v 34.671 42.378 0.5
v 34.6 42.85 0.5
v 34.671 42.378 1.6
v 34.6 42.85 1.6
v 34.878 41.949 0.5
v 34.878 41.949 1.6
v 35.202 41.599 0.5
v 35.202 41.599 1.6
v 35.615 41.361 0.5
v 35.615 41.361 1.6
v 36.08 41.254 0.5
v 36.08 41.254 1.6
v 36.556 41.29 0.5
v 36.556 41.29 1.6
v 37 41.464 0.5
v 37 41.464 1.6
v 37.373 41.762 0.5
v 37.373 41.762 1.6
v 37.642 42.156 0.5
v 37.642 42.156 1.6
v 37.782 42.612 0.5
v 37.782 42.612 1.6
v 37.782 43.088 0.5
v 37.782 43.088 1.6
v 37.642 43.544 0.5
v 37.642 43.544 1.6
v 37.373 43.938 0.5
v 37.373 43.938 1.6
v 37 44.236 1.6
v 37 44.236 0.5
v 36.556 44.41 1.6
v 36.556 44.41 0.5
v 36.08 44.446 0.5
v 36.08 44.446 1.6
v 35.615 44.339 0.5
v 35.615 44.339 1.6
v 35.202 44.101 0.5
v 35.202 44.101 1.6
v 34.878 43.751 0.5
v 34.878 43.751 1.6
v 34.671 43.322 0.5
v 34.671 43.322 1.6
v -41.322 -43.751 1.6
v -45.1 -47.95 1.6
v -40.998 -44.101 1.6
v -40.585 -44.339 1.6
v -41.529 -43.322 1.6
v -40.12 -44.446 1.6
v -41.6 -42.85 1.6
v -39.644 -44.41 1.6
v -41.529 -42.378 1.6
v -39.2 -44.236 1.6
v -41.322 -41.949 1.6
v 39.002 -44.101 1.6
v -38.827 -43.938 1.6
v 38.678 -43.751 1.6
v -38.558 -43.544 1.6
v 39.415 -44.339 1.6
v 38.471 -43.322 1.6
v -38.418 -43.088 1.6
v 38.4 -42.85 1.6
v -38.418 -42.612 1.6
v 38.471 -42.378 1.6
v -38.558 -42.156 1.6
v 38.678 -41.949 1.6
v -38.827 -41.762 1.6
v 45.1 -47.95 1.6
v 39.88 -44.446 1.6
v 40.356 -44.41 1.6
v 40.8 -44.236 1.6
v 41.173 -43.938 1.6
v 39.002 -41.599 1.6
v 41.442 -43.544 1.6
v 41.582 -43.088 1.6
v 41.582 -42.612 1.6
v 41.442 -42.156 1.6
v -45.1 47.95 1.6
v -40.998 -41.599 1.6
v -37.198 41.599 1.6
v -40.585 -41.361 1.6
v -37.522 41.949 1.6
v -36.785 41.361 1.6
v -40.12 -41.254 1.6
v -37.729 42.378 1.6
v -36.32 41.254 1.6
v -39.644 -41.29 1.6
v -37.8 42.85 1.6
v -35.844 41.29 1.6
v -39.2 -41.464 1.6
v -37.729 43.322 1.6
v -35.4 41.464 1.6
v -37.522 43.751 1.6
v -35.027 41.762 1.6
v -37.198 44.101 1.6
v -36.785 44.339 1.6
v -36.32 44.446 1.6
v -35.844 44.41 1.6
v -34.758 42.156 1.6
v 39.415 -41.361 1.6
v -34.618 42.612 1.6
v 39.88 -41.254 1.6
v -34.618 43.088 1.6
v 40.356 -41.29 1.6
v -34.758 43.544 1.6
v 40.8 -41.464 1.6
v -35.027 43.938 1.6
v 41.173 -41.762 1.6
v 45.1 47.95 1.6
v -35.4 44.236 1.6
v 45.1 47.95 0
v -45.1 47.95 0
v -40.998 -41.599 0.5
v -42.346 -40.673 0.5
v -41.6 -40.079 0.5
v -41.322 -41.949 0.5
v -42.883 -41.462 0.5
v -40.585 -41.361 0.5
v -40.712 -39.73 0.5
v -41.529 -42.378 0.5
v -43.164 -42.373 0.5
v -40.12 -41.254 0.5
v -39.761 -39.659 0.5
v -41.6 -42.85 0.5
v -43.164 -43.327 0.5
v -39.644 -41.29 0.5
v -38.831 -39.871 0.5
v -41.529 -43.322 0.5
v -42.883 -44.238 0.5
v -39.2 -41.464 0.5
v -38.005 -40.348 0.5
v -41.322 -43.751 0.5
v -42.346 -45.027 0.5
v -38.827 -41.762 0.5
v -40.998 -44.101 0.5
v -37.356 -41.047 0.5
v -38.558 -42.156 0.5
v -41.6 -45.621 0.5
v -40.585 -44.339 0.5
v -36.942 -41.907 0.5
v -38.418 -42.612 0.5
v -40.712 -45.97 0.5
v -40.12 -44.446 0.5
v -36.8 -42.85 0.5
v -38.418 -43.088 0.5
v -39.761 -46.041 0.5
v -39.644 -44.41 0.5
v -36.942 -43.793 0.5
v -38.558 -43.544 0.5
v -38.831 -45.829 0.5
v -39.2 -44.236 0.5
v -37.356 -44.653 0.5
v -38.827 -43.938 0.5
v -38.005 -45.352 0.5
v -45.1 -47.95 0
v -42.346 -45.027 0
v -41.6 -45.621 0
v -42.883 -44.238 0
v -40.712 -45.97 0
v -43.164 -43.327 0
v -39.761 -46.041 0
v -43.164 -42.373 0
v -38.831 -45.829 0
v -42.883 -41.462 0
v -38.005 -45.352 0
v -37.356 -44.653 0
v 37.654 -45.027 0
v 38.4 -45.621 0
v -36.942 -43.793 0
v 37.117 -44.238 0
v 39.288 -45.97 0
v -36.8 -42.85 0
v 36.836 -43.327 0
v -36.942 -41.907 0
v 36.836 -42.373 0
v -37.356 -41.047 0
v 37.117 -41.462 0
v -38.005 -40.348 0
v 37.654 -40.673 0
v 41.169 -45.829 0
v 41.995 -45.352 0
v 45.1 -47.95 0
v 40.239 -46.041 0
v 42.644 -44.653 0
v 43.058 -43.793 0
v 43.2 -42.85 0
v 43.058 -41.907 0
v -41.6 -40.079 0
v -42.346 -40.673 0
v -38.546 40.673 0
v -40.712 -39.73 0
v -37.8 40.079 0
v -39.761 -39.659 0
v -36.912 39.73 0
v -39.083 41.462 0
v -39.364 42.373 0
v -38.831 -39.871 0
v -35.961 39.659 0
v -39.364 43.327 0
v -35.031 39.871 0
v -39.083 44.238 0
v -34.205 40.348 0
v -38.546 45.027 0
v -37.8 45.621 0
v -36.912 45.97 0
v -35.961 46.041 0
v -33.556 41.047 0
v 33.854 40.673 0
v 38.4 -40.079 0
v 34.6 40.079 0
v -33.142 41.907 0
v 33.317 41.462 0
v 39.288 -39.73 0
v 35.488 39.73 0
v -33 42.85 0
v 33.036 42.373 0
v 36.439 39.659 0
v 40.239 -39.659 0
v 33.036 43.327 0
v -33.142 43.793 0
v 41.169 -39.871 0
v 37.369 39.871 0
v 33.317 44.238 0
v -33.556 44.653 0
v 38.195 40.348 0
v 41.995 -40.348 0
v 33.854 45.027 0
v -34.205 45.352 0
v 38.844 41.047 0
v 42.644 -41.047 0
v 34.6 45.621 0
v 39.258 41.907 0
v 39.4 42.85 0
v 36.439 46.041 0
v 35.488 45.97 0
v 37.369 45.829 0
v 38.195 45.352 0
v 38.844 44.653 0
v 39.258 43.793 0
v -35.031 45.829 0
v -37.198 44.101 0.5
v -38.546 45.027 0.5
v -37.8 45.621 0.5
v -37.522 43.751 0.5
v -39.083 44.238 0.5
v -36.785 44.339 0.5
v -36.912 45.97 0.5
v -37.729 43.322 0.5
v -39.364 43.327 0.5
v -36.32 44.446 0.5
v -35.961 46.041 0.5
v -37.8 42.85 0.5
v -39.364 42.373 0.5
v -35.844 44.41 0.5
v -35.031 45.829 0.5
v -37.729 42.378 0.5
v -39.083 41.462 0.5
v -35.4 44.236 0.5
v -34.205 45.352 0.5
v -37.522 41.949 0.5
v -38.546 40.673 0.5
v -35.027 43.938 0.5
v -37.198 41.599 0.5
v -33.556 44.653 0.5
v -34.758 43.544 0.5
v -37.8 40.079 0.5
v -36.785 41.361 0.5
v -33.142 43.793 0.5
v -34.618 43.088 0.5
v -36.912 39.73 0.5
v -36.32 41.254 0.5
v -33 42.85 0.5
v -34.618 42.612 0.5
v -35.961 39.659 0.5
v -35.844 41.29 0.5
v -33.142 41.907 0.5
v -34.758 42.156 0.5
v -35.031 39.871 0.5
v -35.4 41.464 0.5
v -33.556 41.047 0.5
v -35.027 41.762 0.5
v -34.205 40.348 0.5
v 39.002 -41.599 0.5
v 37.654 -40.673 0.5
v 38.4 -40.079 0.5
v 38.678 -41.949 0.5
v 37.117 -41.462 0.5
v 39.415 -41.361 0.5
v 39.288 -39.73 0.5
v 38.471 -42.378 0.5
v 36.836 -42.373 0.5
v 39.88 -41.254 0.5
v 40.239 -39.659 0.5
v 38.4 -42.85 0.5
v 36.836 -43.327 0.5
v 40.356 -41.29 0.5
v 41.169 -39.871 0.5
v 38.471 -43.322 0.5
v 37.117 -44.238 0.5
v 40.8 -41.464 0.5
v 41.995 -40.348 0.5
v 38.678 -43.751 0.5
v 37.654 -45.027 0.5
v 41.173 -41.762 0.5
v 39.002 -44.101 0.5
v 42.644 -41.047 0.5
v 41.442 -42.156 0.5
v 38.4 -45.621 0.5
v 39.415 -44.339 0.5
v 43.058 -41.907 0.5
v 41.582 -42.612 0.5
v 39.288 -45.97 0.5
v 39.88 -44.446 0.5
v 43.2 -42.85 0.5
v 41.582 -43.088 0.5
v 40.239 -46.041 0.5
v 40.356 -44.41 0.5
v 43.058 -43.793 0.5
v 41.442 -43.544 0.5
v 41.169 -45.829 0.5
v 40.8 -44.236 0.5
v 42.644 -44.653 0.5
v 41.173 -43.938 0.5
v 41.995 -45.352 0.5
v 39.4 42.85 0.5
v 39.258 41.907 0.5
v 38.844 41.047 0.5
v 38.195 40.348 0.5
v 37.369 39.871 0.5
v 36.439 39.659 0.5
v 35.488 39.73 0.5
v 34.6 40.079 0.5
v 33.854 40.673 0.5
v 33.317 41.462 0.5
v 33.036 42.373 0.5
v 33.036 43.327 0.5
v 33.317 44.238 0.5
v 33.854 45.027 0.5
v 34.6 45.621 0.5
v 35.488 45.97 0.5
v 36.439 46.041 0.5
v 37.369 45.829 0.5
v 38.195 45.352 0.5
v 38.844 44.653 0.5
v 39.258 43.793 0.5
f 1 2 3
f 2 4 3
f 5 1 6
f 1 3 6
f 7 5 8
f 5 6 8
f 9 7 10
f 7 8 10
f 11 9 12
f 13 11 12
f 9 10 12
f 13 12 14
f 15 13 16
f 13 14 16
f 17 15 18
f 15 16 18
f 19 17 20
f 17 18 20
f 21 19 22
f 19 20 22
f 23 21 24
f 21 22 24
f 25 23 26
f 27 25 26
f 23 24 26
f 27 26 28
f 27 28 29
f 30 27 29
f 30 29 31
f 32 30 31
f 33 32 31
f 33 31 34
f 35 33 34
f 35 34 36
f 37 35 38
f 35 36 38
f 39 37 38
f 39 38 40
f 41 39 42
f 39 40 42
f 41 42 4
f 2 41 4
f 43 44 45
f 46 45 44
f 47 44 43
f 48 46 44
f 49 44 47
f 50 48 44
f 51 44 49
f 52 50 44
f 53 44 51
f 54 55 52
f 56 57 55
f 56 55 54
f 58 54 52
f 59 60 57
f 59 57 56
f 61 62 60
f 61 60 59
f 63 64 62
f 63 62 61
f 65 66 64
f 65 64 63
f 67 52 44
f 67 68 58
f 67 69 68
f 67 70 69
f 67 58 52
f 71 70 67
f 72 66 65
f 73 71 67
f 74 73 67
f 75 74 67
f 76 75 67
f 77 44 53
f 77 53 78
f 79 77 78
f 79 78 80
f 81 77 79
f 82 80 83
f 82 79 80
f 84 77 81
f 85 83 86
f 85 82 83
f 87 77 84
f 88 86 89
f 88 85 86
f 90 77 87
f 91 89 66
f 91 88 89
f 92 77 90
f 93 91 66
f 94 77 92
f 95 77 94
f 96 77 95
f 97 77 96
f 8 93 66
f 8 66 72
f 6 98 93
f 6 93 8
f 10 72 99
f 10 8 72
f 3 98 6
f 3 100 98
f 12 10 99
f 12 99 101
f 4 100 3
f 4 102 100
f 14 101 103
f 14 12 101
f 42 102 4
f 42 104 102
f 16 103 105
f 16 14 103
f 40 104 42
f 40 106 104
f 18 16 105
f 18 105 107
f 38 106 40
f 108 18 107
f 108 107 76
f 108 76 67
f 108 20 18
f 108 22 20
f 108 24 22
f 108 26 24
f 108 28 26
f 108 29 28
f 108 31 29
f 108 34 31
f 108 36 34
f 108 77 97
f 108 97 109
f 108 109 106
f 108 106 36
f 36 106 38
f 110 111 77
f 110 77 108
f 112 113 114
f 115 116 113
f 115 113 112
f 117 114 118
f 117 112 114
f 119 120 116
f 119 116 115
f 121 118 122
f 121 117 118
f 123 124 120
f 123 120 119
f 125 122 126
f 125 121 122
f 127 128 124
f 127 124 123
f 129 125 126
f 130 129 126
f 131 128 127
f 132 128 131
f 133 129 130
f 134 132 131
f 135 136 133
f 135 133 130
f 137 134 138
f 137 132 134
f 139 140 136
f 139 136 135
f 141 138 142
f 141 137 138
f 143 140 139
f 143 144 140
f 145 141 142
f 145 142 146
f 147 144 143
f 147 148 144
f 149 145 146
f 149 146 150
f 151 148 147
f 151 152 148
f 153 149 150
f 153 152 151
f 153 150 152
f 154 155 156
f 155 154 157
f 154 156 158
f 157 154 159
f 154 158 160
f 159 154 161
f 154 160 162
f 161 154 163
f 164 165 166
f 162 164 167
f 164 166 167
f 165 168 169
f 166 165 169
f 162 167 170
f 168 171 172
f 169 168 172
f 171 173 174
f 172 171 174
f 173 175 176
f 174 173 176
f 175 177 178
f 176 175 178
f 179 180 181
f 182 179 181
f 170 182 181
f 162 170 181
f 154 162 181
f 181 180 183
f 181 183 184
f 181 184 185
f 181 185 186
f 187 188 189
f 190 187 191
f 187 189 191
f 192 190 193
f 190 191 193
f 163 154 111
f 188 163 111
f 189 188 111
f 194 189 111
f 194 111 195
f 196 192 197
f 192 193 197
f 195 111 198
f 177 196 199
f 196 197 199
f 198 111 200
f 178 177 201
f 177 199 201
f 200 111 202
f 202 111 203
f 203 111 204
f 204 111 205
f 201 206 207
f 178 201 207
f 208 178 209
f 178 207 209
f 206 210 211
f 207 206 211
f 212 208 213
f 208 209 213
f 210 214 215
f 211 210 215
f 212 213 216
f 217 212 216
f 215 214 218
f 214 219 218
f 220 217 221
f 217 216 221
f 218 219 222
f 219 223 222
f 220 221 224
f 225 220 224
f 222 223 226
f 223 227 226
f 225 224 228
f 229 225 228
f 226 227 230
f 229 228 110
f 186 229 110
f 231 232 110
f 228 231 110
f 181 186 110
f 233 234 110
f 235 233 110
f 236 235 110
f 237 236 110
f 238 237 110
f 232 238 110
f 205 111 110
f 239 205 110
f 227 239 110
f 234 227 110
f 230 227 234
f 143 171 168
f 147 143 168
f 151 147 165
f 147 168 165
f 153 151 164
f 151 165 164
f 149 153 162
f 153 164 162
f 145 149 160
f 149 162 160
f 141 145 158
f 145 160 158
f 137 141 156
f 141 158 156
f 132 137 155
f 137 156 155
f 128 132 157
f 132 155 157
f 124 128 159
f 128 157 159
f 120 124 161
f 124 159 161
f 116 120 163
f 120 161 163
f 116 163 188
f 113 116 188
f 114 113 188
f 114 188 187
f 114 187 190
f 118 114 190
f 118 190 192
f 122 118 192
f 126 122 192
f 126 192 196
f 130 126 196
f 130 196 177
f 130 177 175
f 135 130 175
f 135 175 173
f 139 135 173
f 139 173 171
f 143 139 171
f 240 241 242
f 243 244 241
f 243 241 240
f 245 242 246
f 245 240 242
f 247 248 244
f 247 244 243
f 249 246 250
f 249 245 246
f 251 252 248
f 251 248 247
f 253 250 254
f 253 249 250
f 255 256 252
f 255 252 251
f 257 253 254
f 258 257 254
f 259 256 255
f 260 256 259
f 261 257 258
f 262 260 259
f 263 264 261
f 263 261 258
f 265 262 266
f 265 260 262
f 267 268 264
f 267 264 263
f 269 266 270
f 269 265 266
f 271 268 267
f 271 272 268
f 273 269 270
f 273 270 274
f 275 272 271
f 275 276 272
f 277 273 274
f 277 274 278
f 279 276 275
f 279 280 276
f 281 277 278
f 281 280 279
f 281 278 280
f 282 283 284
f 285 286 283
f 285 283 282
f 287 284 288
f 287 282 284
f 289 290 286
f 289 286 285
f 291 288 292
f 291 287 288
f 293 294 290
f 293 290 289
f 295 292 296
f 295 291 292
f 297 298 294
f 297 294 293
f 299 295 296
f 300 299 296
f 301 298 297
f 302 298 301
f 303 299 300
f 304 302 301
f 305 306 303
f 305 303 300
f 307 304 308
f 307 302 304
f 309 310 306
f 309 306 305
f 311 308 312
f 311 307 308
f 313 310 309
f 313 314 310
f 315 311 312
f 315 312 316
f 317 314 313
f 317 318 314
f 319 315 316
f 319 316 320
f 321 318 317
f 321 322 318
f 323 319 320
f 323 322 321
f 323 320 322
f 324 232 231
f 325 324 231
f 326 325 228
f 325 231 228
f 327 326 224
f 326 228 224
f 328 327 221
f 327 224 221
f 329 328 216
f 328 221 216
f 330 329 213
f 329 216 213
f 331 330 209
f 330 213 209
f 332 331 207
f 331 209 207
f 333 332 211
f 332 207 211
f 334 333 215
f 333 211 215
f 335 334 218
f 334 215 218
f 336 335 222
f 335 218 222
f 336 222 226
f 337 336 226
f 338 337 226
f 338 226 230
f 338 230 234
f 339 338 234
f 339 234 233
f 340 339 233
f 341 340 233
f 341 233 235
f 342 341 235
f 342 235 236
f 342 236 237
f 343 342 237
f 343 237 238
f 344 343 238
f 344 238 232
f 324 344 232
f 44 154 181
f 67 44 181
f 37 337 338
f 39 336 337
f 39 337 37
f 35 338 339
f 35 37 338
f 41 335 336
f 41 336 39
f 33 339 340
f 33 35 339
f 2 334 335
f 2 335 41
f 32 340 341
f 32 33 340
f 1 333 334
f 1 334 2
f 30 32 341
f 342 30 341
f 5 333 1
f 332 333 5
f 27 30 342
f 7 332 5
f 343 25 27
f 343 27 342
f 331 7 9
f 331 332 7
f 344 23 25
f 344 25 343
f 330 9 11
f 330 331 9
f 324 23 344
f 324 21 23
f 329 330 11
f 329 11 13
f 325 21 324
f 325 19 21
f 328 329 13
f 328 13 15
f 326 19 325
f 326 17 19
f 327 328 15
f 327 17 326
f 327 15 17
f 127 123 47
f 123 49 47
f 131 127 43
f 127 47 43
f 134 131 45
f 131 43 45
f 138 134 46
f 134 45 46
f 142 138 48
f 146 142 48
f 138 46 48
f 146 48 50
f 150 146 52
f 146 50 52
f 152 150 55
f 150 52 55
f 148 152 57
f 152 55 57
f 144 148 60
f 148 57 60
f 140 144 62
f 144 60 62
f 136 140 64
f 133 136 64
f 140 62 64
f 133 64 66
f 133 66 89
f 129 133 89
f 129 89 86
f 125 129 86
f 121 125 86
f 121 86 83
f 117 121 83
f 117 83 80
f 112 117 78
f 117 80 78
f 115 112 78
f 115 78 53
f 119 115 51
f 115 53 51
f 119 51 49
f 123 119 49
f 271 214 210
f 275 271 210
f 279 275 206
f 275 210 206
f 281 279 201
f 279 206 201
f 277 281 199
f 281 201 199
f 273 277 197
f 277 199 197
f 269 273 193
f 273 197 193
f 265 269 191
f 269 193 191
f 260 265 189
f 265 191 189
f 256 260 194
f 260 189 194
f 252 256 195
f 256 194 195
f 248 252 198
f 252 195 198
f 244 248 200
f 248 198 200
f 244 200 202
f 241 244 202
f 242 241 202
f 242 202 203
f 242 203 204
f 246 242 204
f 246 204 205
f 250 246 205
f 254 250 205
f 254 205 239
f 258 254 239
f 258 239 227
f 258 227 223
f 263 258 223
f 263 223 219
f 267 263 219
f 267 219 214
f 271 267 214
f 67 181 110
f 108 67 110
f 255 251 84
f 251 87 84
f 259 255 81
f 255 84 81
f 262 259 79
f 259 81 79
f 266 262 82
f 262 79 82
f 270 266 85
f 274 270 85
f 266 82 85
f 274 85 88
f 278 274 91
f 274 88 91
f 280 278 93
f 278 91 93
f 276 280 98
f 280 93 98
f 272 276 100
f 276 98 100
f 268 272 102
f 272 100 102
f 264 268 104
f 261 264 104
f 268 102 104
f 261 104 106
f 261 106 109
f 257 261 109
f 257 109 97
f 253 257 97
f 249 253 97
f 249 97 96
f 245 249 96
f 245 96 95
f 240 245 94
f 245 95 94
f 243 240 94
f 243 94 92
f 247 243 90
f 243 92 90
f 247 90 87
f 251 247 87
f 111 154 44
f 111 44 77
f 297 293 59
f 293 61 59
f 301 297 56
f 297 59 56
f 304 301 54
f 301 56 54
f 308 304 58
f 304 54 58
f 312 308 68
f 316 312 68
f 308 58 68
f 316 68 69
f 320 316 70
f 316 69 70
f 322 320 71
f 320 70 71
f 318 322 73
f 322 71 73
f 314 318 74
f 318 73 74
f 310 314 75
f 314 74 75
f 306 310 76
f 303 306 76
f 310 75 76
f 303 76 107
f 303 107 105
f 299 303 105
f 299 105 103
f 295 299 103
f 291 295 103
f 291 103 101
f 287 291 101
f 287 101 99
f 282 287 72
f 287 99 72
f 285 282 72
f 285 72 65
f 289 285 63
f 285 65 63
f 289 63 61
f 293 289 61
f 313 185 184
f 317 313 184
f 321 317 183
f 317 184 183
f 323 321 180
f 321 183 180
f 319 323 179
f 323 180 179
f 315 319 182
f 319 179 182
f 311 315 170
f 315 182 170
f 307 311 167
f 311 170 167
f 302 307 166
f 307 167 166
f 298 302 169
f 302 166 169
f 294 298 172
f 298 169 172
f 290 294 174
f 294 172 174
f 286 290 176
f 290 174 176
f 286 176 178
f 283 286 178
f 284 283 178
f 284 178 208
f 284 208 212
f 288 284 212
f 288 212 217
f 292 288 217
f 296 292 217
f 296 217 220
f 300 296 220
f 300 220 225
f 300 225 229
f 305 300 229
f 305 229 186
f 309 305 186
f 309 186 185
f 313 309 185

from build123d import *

# Parameters (mm, degrees)
F0_W           = 90.2
F0_H           = 95.9
F1_DEPTH       = 1.6
F2_D           = 3.2
F2_CBORE_D     = 6.4
F2_CBORE_DEPTH = 0.5
F3_D           = 3.2
F3_CBORE_D     = 6.4
F3_CBORE_DEPTH = 0.5
F4_D           = 3.2
F4_CBORE_D     = 6.4
F4_CBORE_DEPTH = 0.5
F5_D           = 3.2
F5_CBORE_D     = 6.4
F5_CBORE_DEPTH = 0.5


with BuildPart() as f1:
    # F0 (on Top) → F1 (new body)
    with BuildSketch(Plane.XY):
        Rectangle(F0_W, F0_H)
    extrude(amount=F1_DEPTH)

    # F2 (through all)
    with Locations(Plane(origin=(0, 0, 0), x_dir=(1, 0, 0), z_dir=(0, 0, -1))):
        with Locations((-36.2, -42.85)):
            CounterBoreHole(F2_D / 2, F2_CBORE_D / 2, F2_CBORE_DEPTH)

    # F3 (through all)
    with Locations(Plane(origin=(0, 0, 0), x_dir=(1, 0, 0), z_dir=(0, 0, -1))):
        with Locations((-40, 42.85)):
            CounterBoreHole(F3_D / 2, F3_CBORE_D / 2, F3_CBORE_DEPTH)

    # F4 (through all)
    with Locations(Plane(origin=(0, 0, 0), x_dir=(1, 0, 0), z_dir=(0, 0, -1))):
        with Locations((36.2, -42.85)):
            CounterBoreHole(F4_D / 2, F4_CBORE_D / 2, F4_CBORE_DEPTH)

    # F5 (through all)
    with Locations(Plane(origin=(0, 0, 0), x_dir=(1, 0, 0), z_dir=(0, 0, -1))):
        with Locations((40, 42.85)):
            CounterBoreHole(F5_D / 2, F5_CBORE_D / 2, F5_CBORE_DEPTH)


solid = f1.part
